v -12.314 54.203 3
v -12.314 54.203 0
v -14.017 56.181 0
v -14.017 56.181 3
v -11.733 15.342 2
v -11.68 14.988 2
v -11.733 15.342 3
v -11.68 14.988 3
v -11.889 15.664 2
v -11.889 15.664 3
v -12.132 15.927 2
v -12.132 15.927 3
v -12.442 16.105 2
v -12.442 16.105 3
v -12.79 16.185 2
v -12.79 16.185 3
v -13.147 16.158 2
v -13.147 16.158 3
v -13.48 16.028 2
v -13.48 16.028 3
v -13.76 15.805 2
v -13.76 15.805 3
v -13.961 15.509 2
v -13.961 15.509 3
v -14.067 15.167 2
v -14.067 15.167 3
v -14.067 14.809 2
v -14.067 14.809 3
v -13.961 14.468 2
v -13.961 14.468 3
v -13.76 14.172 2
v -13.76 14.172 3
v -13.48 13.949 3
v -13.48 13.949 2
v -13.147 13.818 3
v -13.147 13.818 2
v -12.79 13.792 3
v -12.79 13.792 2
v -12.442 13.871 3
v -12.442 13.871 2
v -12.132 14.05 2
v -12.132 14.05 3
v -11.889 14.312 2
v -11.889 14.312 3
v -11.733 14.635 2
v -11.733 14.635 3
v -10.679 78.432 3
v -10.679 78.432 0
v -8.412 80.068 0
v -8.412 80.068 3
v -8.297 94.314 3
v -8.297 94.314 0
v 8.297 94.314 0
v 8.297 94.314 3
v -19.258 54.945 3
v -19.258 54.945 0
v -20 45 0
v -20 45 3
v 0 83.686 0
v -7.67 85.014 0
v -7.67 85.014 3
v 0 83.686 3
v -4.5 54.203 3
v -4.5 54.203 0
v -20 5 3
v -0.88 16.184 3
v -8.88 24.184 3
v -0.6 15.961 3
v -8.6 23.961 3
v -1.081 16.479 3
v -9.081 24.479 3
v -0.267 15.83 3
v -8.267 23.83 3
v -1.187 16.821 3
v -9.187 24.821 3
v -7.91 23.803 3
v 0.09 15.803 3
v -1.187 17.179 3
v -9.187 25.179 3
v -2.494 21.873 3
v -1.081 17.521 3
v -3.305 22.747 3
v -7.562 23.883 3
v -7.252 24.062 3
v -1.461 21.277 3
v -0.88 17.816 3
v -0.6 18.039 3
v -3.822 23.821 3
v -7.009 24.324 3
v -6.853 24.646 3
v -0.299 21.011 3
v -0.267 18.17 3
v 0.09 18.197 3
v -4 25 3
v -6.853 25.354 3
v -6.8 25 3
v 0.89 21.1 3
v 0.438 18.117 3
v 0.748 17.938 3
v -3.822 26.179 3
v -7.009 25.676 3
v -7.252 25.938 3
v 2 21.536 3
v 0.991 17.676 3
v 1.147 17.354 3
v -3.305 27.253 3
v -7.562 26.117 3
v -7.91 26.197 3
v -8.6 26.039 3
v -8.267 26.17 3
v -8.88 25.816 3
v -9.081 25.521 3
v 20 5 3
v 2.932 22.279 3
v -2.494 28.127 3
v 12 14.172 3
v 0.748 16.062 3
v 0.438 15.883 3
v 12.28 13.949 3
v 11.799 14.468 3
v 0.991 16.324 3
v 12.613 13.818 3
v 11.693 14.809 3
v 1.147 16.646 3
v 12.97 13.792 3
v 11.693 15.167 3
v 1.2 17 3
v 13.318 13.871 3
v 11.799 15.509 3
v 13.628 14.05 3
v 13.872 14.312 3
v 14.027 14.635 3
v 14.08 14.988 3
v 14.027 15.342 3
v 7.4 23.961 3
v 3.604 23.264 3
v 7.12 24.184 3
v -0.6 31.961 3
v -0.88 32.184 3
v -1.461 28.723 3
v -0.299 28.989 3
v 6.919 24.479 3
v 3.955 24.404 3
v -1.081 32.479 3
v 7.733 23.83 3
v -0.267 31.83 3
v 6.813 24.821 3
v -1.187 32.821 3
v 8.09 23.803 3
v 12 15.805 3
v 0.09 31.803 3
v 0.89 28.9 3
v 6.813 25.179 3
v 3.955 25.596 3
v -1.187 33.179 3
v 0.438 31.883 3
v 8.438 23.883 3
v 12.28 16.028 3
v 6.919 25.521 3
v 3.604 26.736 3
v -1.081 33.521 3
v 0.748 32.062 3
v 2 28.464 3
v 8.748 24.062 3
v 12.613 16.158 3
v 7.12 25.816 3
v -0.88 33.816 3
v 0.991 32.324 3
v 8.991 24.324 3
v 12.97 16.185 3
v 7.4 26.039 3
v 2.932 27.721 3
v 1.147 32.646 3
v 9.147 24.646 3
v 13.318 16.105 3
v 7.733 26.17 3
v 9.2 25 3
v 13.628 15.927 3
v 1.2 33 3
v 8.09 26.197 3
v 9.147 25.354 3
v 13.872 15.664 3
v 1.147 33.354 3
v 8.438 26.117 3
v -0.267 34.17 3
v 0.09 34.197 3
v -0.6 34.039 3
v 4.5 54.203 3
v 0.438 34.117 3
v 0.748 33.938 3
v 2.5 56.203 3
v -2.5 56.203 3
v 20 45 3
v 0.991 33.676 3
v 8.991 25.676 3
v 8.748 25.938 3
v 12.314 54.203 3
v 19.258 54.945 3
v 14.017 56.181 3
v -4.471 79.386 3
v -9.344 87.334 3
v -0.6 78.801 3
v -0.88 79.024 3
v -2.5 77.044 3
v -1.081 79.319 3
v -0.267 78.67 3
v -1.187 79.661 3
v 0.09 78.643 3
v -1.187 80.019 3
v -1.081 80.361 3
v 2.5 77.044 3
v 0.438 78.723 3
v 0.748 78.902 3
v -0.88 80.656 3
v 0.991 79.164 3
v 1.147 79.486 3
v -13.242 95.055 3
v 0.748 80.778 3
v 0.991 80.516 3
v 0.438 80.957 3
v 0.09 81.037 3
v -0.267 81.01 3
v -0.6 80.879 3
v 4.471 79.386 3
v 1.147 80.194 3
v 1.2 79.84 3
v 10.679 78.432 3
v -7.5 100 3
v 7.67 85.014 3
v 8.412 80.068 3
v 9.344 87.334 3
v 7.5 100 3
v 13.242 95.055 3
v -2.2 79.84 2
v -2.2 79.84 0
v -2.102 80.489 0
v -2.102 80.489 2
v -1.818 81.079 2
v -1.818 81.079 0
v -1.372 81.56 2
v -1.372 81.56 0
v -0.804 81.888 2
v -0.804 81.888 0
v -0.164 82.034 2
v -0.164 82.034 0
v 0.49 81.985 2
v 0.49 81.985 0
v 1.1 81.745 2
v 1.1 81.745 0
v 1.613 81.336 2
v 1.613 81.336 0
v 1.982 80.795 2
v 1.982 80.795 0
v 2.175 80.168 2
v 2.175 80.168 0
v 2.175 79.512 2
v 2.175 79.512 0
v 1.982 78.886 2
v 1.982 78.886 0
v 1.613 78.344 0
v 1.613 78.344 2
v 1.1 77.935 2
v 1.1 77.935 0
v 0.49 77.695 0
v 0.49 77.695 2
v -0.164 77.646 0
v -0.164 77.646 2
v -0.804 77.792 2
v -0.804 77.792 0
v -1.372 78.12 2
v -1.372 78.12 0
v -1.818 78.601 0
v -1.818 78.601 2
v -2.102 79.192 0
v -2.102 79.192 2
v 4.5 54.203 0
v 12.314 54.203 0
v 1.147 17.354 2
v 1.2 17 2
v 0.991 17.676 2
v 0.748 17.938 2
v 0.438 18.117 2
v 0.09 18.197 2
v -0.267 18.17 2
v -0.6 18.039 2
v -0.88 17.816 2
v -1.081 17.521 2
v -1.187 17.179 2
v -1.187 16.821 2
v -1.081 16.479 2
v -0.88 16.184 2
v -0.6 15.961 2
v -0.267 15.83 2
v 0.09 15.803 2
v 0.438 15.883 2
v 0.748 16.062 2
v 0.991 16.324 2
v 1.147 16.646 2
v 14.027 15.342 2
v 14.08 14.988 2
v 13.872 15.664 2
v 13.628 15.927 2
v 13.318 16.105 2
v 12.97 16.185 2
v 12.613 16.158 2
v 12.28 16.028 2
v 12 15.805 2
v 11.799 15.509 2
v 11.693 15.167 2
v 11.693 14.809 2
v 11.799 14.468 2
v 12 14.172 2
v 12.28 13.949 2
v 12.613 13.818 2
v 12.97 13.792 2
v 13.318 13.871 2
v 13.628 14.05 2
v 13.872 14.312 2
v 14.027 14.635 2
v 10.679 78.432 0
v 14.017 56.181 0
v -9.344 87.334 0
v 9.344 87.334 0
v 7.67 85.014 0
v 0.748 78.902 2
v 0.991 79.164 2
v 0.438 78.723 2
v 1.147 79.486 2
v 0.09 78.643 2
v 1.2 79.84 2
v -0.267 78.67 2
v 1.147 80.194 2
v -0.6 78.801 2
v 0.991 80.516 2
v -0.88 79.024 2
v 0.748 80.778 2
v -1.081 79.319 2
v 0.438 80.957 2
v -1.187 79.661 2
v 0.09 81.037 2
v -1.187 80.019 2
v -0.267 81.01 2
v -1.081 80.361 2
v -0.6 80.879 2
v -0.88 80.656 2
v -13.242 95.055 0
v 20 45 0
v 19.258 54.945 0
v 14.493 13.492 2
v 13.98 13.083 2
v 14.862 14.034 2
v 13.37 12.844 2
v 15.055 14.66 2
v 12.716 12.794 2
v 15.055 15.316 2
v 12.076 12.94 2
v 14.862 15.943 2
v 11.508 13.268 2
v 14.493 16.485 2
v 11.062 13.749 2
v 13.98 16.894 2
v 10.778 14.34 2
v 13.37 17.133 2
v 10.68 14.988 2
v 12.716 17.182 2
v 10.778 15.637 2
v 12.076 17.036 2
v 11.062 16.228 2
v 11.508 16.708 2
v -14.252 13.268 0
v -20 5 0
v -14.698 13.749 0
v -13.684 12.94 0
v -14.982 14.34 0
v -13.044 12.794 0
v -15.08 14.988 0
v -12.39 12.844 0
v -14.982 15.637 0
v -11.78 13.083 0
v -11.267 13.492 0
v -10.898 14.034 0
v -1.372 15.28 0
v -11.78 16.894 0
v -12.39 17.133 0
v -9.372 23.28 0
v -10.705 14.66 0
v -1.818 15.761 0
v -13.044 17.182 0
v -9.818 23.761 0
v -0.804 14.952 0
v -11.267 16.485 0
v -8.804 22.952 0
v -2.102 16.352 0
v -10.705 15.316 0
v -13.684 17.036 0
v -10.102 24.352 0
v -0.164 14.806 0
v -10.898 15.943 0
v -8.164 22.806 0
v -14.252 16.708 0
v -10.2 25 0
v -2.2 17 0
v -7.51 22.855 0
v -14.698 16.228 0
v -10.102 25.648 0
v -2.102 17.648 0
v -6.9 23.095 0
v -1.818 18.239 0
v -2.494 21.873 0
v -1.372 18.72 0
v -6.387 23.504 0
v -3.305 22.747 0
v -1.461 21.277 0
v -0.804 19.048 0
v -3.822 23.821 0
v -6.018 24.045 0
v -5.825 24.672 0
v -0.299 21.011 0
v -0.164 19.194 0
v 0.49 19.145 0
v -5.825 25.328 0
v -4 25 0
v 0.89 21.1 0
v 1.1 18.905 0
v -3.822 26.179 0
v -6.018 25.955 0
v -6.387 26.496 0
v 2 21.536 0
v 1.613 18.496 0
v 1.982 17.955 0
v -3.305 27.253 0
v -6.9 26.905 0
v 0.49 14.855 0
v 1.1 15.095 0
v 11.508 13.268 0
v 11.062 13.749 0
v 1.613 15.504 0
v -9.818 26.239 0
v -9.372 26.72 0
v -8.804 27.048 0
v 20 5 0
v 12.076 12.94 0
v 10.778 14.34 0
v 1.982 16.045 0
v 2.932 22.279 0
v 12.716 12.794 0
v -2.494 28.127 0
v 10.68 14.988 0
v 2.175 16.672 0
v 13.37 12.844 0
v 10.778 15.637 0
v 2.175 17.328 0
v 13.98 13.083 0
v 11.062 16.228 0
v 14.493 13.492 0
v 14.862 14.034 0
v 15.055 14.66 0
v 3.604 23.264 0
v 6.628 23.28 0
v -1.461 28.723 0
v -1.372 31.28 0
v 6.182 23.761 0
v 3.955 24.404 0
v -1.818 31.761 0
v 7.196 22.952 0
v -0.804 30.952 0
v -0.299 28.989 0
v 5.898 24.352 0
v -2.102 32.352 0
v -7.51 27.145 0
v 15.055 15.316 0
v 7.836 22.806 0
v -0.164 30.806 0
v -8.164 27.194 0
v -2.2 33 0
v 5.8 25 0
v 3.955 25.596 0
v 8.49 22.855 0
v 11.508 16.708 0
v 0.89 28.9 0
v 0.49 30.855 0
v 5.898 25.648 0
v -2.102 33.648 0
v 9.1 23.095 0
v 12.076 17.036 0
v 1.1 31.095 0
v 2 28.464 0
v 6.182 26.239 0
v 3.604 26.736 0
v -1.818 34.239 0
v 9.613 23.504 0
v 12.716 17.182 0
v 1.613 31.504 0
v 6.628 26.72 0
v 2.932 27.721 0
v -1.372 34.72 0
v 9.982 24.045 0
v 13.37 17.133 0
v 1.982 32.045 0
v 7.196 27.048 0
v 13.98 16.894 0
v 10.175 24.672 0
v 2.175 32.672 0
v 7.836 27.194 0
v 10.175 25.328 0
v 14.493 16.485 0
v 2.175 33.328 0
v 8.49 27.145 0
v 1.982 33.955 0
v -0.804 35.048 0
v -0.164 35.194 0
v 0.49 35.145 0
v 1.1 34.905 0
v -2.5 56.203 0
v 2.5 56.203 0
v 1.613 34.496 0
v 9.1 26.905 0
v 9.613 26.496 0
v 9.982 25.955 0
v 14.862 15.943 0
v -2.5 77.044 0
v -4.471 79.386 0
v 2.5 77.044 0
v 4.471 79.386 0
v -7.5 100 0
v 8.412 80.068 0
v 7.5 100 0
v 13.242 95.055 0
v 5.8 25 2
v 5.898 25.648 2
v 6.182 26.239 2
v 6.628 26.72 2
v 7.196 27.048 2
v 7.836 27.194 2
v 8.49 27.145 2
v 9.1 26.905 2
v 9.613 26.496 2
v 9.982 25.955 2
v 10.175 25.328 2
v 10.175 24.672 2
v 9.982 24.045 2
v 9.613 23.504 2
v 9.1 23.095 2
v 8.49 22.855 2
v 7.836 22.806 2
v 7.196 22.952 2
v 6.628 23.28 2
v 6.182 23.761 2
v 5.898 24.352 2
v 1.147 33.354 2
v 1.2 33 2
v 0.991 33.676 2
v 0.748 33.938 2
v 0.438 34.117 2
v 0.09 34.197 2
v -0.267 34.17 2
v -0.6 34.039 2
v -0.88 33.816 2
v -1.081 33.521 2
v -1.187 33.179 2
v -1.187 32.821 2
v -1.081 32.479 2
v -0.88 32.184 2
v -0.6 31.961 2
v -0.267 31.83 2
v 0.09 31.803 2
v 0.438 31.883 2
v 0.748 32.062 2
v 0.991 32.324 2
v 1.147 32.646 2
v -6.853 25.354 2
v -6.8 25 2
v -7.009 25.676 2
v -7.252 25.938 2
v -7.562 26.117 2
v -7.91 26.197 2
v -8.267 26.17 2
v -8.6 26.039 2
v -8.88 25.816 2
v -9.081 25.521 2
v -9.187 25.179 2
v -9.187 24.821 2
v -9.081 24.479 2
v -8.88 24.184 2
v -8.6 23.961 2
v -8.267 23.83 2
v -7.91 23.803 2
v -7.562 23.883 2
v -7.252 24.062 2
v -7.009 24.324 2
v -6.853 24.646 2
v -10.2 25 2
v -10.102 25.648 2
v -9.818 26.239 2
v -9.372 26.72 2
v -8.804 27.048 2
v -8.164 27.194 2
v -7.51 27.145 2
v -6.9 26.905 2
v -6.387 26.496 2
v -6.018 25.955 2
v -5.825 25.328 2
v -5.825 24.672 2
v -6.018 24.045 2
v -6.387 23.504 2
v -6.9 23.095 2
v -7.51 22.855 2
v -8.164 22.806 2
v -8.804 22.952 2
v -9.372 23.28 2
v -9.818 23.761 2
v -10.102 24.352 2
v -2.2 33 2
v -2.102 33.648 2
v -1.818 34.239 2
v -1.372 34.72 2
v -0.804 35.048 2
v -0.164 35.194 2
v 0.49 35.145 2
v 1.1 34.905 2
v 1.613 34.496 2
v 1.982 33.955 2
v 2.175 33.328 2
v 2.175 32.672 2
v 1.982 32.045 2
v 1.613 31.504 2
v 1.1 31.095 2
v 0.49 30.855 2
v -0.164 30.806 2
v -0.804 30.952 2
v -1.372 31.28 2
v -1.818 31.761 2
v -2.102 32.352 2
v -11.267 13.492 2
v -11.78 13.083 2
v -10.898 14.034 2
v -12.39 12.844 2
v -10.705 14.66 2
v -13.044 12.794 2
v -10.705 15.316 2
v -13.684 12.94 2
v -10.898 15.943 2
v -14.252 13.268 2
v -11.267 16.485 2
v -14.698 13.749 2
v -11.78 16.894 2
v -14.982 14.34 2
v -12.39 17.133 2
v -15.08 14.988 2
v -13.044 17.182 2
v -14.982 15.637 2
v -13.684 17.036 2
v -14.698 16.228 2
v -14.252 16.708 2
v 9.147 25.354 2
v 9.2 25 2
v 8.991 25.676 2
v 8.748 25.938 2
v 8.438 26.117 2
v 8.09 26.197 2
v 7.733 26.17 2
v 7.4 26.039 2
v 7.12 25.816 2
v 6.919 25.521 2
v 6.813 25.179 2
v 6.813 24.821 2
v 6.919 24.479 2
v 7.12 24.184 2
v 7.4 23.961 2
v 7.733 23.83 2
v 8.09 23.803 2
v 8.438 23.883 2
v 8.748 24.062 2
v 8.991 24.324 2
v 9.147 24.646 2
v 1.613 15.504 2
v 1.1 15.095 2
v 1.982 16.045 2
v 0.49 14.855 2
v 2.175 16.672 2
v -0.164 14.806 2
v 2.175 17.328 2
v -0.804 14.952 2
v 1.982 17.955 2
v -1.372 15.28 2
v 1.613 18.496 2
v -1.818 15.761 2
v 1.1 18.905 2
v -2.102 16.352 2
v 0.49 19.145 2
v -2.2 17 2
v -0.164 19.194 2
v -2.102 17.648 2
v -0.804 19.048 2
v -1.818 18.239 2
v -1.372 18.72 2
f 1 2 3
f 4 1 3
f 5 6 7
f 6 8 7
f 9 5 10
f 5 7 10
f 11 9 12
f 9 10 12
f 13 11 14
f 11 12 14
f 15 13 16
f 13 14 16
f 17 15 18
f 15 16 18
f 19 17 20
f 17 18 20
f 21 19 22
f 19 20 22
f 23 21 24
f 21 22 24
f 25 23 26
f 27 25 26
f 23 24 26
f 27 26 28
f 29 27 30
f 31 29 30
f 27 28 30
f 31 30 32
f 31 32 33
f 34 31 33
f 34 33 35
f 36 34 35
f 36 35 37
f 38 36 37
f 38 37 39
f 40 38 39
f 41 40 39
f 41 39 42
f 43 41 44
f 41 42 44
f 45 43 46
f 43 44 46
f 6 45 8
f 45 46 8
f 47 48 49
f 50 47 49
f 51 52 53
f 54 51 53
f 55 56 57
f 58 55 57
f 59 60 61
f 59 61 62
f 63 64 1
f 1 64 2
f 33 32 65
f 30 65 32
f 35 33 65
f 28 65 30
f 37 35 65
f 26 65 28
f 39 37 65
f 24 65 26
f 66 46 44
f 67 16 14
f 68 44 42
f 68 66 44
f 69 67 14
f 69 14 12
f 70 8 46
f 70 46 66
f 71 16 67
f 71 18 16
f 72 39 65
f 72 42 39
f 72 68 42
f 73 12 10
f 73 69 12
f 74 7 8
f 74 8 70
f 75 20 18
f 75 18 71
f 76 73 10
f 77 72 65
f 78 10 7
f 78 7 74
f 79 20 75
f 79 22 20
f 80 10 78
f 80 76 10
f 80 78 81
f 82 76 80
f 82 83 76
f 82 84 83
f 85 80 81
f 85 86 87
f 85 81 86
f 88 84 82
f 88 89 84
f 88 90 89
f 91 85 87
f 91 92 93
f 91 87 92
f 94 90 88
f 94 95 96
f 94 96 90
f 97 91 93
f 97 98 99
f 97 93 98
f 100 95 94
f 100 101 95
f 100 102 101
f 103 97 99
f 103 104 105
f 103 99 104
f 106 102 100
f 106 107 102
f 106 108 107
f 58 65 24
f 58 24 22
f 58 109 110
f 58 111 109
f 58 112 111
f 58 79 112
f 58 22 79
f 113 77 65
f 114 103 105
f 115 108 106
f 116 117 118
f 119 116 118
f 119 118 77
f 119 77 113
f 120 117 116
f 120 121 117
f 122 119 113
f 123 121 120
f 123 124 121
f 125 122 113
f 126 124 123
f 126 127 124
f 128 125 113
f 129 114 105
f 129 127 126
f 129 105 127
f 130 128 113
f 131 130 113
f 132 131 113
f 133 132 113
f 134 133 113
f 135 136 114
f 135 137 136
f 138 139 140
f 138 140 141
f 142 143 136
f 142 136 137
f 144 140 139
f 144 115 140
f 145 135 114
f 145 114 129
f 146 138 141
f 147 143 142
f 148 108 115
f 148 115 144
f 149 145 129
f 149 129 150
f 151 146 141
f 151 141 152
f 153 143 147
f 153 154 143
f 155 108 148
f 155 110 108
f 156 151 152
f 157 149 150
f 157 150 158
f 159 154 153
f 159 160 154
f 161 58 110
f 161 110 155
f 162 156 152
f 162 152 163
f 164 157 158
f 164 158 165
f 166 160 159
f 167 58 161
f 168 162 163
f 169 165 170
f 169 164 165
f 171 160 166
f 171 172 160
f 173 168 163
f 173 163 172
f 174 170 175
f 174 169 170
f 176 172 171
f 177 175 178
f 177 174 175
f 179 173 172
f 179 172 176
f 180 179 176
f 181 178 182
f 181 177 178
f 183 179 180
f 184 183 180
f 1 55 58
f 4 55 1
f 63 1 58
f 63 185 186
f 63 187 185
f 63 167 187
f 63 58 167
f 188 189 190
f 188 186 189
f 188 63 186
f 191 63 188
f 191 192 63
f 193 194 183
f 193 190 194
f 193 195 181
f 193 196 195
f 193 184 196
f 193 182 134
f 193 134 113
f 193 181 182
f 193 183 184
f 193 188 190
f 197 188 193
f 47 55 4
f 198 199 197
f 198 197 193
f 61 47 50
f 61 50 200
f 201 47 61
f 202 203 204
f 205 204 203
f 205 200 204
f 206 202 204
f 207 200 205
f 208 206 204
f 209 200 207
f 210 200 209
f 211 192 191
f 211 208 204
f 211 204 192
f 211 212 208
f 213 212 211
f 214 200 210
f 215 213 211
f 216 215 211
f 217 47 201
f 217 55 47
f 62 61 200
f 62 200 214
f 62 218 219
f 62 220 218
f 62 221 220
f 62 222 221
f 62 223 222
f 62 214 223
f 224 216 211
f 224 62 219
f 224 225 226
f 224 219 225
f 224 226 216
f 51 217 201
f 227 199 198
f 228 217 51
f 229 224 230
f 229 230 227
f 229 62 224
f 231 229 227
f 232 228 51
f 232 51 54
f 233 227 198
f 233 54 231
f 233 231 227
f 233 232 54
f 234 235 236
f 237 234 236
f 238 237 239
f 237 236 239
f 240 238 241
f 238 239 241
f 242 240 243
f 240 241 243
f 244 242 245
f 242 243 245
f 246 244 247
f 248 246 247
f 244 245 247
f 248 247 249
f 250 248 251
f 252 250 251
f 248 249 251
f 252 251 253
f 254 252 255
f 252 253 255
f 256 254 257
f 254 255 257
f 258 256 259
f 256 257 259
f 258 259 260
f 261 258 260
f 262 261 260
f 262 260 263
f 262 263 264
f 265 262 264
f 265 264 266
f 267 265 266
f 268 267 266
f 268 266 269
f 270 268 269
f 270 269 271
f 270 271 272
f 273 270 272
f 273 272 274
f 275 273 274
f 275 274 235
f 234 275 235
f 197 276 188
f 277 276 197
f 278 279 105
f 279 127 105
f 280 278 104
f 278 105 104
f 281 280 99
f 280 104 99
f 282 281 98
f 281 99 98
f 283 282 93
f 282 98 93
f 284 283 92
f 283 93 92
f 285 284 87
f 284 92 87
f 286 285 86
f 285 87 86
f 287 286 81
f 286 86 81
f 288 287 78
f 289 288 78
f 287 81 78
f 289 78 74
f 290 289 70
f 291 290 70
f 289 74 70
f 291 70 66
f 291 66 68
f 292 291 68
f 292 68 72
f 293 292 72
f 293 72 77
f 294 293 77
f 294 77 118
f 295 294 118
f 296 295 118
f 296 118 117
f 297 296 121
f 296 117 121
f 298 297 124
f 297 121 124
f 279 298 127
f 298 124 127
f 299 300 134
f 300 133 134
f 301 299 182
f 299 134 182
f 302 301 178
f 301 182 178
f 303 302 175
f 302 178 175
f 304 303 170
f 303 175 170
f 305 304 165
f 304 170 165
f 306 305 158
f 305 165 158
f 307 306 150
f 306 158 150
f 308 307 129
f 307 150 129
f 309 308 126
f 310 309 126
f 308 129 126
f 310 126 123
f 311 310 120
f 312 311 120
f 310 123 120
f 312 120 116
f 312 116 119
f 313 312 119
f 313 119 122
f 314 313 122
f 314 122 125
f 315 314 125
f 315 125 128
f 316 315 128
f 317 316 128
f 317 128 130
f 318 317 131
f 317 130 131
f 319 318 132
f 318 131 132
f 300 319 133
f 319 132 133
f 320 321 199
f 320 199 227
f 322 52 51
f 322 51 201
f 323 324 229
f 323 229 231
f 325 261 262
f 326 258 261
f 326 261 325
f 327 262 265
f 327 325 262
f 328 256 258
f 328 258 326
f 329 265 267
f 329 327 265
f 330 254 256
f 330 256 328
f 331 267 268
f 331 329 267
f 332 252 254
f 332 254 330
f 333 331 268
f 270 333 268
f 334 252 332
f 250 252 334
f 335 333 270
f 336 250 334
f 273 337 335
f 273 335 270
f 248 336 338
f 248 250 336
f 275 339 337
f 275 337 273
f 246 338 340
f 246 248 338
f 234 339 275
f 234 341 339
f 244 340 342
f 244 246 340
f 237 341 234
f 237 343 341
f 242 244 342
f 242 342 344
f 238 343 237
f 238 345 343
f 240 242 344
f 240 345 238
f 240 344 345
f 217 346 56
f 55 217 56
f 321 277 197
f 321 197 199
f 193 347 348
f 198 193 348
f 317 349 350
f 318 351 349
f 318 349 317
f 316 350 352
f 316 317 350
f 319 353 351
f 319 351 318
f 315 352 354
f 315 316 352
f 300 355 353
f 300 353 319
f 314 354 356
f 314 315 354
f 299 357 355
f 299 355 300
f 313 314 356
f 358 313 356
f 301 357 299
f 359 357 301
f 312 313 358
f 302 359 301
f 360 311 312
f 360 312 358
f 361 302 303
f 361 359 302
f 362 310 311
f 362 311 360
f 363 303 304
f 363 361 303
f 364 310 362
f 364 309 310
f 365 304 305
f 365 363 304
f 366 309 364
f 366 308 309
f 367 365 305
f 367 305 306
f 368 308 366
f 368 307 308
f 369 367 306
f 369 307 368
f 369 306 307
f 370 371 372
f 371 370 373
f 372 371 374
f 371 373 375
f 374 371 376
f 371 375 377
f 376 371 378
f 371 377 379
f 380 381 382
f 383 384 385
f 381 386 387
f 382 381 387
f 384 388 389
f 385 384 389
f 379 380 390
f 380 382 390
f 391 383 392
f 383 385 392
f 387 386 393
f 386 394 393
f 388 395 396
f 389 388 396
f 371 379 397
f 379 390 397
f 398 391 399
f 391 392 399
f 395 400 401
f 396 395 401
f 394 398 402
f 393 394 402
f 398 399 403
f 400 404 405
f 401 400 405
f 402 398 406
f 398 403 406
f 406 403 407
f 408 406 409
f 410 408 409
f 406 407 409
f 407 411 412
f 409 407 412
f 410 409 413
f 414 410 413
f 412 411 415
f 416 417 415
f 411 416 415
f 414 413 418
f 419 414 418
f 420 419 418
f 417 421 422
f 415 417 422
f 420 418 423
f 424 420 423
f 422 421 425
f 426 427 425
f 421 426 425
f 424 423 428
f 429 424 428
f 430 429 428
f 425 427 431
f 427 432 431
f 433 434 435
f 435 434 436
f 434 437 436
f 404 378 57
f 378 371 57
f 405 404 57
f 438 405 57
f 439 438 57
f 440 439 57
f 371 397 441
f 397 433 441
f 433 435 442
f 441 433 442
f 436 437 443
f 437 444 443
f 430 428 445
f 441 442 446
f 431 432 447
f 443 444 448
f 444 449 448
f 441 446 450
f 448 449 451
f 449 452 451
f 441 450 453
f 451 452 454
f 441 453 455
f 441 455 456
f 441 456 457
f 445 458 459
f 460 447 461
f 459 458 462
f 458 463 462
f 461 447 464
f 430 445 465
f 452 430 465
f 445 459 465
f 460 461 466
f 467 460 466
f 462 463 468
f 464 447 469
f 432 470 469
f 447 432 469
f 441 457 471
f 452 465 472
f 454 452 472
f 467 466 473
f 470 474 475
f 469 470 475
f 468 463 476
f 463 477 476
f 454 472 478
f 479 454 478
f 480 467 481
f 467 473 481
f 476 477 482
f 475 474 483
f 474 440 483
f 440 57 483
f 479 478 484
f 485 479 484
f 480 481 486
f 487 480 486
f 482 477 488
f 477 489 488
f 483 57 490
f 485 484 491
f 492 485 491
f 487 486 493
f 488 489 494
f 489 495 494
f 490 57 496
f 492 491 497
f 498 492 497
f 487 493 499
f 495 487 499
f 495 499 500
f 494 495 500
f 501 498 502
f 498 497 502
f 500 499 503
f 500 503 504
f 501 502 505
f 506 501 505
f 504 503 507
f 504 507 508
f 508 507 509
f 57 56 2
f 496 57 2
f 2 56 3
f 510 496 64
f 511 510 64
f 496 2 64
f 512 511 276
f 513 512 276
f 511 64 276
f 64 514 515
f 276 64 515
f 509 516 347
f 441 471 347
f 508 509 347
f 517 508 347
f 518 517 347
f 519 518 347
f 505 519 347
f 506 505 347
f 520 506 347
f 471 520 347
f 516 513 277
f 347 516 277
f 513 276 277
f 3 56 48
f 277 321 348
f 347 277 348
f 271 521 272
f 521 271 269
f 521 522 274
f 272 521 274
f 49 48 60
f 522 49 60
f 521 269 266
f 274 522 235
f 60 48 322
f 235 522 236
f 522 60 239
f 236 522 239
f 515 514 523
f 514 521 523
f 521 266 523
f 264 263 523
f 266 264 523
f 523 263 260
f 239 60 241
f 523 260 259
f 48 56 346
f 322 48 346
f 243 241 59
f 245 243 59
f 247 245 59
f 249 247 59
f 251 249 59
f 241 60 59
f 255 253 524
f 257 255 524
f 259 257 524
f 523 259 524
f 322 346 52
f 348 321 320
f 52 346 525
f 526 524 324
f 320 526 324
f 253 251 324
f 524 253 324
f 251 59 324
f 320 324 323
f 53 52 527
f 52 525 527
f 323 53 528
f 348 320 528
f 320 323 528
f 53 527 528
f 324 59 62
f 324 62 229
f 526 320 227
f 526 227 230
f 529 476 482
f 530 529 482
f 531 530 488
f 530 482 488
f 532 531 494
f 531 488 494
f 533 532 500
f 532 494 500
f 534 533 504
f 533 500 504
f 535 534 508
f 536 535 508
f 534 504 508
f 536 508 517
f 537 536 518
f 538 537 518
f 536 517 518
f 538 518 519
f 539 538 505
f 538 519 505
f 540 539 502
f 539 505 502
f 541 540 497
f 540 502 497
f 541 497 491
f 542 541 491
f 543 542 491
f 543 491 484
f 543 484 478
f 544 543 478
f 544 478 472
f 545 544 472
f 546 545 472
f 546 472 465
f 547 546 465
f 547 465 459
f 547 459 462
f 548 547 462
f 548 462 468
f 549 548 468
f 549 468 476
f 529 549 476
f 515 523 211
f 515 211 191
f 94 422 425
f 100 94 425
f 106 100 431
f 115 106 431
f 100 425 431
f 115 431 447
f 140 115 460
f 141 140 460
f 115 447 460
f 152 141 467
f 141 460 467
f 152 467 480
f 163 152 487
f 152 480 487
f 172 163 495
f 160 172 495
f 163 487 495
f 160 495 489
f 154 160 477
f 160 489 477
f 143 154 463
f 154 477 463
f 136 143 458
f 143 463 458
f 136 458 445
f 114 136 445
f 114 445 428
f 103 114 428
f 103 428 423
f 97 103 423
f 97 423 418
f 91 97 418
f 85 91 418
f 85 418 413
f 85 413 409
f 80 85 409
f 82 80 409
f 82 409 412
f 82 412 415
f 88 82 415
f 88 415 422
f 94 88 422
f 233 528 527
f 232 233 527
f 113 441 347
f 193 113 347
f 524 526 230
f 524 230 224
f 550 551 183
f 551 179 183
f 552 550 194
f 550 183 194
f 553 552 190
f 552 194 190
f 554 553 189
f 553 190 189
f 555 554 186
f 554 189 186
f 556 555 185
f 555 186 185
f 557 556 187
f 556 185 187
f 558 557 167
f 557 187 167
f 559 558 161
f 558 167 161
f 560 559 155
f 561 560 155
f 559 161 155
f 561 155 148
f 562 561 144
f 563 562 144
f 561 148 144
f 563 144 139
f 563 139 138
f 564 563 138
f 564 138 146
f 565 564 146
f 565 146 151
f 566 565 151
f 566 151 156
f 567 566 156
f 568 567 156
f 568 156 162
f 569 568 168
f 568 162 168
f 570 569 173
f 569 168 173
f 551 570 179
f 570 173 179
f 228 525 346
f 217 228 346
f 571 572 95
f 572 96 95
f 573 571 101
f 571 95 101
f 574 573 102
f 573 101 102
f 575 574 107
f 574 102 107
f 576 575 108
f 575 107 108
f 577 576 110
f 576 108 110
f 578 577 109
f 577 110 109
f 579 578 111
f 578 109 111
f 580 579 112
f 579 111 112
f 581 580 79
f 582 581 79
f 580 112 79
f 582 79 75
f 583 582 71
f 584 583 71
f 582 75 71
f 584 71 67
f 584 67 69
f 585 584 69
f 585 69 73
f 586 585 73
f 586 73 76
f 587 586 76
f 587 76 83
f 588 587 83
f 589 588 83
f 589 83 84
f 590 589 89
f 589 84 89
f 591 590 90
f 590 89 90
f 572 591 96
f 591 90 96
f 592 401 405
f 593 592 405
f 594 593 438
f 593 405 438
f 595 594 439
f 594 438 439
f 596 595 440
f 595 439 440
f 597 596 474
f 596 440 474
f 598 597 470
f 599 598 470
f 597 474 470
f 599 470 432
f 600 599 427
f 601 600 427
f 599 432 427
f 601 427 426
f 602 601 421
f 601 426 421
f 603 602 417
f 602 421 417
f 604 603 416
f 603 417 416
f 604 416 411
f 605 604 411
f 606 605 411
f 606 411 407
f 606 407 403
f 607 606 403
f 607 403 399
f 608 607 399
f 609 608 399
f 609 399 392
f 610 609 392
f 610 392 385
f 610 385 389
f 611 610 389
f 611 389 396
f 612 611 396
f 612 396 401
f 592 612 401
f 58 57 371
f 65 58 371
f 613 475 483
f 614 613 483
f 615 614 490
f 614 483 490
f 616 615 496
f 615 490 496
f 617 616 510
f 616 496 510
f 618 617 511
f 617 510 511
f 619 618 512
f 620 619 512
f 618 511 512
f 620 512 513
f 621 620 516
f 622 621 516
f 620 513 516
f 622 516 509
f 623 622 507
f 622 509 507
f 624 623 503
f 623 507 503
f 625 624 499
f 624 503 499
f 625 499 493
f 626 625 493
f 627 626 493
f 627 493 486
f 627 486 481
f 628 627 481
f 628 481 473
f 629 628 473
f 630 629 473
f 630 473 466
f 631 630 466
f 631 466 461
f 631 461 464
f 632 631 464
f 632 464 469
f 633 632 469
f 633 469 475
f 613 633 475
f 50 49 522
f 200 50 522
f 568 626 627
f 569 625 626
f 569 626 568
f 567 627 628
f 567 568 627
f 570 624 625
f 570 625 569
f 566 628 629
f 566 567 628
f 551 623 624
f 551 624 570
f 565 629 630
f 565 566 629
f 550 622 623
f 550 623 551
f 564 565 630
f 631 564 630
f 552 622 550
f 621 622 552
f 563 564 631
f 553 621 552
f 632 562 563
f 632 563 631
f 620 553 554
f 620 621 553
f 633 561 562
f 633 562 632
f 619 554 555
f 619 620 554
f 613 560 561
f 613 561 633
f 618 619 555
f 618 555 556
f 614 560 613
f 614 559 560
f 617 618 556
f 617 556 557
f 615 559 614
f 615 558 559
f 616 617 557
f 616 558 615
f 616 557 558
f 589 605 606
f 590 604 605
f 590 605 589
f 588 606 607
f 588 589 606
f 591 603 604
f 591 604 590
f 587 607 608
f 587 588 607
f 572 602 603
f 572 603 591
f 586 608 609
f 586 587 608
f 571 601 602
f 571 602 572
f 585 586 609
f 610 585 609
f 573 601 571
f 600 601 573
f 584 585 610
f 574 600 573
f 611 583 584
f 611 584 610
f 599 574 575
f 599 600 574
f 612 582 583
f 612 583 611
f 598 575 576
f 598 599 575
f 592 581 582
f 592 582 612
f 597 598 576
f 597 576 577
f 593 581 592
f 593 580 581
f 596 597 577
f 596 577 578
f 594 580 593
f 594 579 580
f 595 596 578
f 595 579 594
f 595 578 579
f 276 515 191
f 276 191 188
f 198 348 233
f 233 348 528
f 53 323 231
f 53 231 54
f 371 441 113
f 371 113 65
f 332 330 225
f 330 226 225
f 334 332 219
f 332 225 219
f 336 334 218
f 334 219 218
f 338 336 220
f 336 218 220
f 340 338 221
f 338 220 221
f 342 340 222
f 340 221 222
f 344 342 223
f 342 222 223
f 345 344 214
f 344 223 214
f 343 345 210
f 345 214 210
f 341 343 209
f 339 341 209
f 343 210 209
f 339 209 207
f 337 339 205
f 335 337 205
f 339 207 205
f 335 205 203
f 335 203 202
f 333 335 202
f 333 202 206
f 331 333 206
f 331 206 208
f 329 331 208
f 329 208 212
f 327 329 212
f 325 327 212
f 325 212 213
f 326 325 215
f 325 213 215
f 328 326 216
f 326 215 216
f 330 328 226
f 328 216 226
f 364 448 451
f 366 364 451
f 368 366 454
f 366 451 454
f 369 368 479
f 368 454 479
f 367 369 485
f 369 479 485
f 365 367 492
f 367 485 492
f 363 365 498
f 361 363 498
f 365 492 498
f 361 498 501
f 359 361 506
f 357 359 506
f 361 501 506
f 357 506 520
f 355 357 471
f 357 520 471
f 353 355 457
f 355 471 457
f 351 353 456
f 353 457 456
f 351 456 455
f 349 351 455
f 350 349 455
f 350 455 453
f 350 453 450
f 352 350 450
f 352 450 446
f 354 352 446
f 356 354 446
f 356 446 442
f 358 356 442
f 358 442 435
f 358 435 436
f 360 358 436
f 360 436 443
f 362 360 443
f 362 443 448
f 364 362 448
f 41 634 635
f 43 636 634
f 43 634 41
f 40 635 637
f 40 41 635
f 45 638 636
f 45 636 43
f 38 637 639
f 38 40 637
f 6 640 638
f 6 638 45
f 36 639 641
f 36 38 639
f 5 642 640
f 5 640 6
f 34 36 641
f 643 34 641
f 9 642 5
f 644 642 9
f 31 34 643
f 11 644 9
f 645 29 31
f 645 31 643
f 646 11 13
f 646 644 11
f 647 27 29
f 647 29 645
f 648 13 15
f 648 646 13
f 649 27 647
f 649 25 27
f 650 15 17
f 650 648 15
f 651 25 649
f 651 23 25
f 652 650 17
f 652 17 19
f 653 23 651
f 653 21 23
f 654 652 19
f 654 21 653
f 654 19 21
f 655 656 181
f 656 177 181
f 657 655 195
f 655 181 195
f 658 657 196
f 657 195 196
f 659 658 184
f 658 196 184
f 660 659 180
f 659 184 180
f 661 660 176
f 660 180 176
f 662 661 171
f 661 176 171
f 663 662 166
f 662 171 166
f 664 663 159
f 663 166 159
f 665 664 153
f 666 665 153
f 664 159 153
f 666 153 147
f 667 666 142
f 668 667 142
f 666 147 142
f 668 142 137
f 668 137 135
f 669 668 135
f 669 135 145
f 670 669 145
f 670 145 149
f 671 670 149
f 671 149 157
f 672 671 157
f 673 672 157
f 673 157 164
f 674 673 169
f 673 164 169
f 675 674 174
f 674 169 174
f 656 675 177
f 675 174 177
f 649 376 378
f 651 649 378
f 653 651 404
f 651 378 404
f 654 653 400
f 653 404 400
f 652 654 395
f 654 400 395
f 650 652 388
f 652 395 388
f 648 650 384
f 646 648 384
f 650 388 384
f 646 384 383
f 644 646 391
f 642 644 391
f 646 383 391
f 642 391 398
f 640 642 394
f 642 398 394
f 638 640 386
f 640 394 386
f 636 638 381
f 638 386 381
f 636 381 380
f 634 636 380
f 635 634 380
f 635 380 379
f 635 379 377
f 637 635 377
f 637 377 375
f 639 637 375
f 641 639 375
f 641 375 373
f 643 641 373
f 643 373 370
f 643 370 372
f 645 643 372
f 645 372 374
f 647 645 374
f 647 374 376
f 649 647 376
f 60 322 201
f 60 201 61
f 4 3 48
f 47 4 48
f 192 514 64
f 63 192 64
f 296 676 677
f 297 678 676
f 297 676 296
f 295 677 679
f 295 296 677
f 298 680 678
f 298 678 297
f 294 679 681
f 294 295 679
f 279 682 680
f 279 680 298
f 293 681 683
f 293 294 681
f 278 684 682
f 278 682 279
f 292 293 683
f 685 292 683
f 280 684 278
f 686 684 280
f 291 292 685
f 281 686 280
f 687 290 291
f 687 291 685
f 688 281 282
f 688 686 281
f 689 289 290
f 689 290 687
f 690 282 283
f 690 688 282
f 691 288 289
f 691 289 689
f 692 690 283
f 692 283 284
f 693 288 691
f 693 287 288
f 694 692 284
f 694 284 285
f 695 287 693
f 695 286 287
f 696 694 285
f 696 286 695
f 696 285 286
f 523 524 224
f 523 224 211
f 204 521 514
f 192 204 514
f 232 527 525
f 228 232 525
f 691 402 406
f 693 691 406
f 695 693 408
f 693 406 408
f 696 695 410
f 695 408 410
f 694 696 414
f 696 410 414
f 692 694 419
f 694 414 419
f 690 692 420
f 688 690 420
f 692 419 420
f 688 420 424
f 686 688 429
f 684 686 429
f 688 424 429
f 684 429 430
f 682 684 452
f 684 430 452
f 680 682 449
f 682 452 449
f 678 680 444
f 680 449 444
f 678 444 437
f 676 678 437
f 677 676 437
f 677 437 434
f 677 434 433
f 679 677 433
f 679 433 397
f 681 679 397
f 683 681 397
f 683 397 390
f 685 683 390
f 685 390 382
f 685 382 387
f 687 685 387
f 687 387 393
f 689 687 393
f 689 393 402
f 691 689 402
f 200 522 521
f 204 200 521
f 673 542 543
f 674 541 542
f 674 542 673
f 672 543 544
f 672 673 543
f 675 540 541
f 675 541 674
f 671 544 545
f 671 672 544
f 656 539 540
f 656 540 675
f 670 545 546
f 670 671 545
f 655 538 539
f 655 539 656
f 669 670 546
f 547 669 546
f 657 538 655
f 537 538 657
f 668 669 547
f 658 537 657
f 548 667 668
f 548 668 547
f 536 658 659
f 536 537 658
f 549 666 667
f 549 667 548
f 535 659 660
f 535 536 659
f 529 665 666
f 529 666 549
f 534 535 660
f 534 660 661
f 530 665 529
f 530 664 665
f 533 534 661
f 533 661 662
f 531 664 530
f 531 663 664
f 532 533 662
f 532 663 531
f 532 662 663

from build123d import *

# Parameters (mm, degrees)
EXTRUDE_1_DEPTH              = 3
CUT_EXTRUDE_1_REACH          = 104.025
SKETCH_2_W                   = 5
SKETCH_2_H                   = 10
HOLE_WIZARD_M2_1_D           = 2.4
HOLE_WIZARD_M2_1_CBORE_D     = 4.4
HOLE_WIZARD_M2_1_CBORE_DEPTH = 2
CUT_EXTRUDE_2_REACH          = 104.025
SKETCH_5_R                   = 4
HOLE_WIZARD_M2_2_D           = 2.4
HOLE_WIZARD_M2_2_CBORE_D     = 4.4
HOLE_WIZARD_M2_2_CBORE_DEPTH = 2
HOLE_WIZARD_M2_3_D           = 2.4
HOLE_WIZARD_M2_3_CBORE_D     = 4.4
HOLE_WIZARD_M2_3_CBORE_DEPTH = 2
CUT_EXTRUDE_3_DEPTH          = 3
HOLE_WIZARD_M2_5_D           = 2.4
HOLE_WIZARD_M2_5_CBORE_D     = 4.4
HOLE_WIZARD_M2_5_CBORE_DEPTH = 2
HOLE_WIZARD_M2_6_D           = 2.4
HOLE_WIZARD_M2_6_CBORE_D     = 4.4
HOLE_WIZARD_M2_6_CBORE_DEPTH = 2
SKETCH_17_OUTSIDE_W          = 82.796
SKETCH_17_OUTSIDE_H          = 242.796
CUT_EXTRUDE_4_DEPTH          = 10


with BuildPart() as part:
    # 草图1 → 凸台-拉伸1 (new body)
    with BuildSketch(Plane.XY):
        Polygon((20, 5), (20, 45), (19.258297735, 54.944681764), (13.241702265, 95.055318236), (7.5, 100), (-7.5, 100), (-13.241702265, 95.055318236), (-19.258297735, 54.944681764), (-20, 45), (-20, 5), (-19.379826327, -4.961389384), (-7.748069469, -98.015444247), (-5.5, -100), (5.5, -100), (7.748069469, -98.015444247), (19.379826327, -4.961389384), align=None)
    extrude(amount=EXTRUDE_1_DEPTH)

    # 草图2 → 切除-拉伸1 (cut, up to next)
    with BuildSketch(Plane.XY.offset(3), mode=Mode.PRIVATE) as cut_extrude_1_sk1:
        Polygon((10, -5), (-10, -5), (0, -22.320508076), align=None)
    cut_extrude_1_tool1 = extrude(cut_extrude_1_sk1.sketch, amount=-CUT_EXTRUDE_1_REACH, mode=Mode.PRIVATE) & part.part
    # 草图2 → 切除-拉伸1 (cut, up to next)
    with BuildSketch(Plane.XY.offset(3), mode=Mode.PRIVATE) as cut_extrude_1_sk2:
        Polygon((6.211088907, -70), (13.938881842, -8.177656525), (2.5, -27.990381057), (2.5, -70), align=None)
    cut_extrude_1_tool2 = extrude(cut_extrude_1_sk2.sketch, amount=-CUT_EXTRUDE_1_REACH, mode=Mode.PRIVATE) & part.part
    # 草图2 → 切除-拉伸1 (cut, up to next)
    with BuildSketch(Plane.XY.offset(3), mode=Mode.PRIVATE) as cut_extrude_1_sk3:
        Polygon((-13.938881842, -8.177656525), (-2.5, -27.990381057), (-2.5, -70), (-6.211088907, -70), align=None)
    cut_extrude_1_tool3 = extrude(cut_extrude_1_sk3.sketch, amount=-CUT_EXTRUDE_1_REACH, mode=Mode.PRIVATE) & part.part
    # 草图2 → 切除-拉伸1 (cut, up to next)
    with BuildSketch(Plane.XY.offset(3), mode=Mode.PRIVATE) as cut_extrude_1_sk4:
        with Locations((0, -85)):
            Rectangle(SKETCH_2_W, SKETCH_2_H)
    cut_extrude_1_tool4 = extrude(cut_extrude_1_sk4.sketch, amount=-CUT_EXTRUDE_1_REACH, mode=Mode.PRIVATE) & part.part
    add(cut_extrude_1_tool1.solids().sort_by_distance((0, -10.773503, 3))[0], mode=Mode.SUBTRACT)
    add(cut_extrude_1_tool2.solids().sort_by_distance((6.712708, -39.914502, 3))[0], mode=Mode.SUBTRACT)
    add(cut_extrude_1_tool3.solids().sort_by_distance((-6.712708, -39.914502, 3))[0], mode=Mode.SUBTRACT)
    add(cut_extrude_1_tool4.solids().sort_by_distance((0, -85, 3))[0], mode=Mode.SUBTRACT)

    # M2 凹头盖螺钉的柱形沉头孔1 (through all)
    with Locations(Plane(origin=(5.586088907, -75, 0), x_dir=(-1, 0, 0), z_dir=(0, 0, -1))):
        with Locations((0, 0), (11.172177814, 0)):
            CounterBoreHole(HOLE_WIZARD_M2_1_D / 2, HOLE_WIZARD_M2_1_CBORE_D / 2, HOLE_WIZARD_M2_1_CBORE_DEPTH)

    # 草图5 → 切除-拉伸2 (cut, up to next)
    with BuildSketch(Plane(origin=(0, 0, 0), x_dir=(-1, 0, 0), z_dir=(0, 0, -1)), mode=Mode.PRIVATE) as cut_extrude_2_sk1:
        with Locations((0, 25)):
            Circle(SKETCH_5_R)
    cut_extrude_2_tool1 = extrude(cut_extrude_2_sk1.sketch, amount=-CUT_EXTRUDE_2_REACH, mode=Mode.PRIVATE) & part.part
    add(cut_extrude_2_tool1.solids().sort_by_distance((0, 25, 0))[0], mode=Mode.SUBTRACT)

    # M2 凹头盖螺钉的柱形沉头孔2 (through all)
    with Locations(Plane(origin=(8, 25, 0), x_dir=(-1, 0, 0), z_dir=(0, 0, -1))):
        with Locations((0, 0), (8, 8), (16, 0), (8, -8)):
            CounterBoreHole(HOLE_WIZARD_M2_2_D / 2, HOLE_WIZARD_M2_2_CBORE_D / 2, HOLE_WIZARD_M2_2_CBORE_DEPTH)

    # M2 凹头盖螺钉的柱形沉头孔3 (through all)
    with Locations(Plane(origin=(12.880020708, -5.011657807, 0), x_dir=(-1, 0, 0), z_dir=(0, 0, -1))):
        with Locations((0, 0), (25.760041416, 0)):
            CounterBoreHole(HOLE_WIZARD_M2_3_D / 2, HOLE_WIZARD_M2_3_CBORE_D / 2, HOLE_WIZARD_M2_3_CBORE_DEPTH)

    # 草图10 → 切除-拉伸3 (cut)
    with BuildSketch(Plane(origin=(0, 0, 0), x_dir=(-1, 0, 0), z_dir=(0, 0, -1))):
        Polygon((-14.016935065, 56.180852205), (-10.679274874, 78.431920145), (-8.411945476, 80.068406675), (-4.470648492, 79.385634325), (-2.5, 77.04424815), (-2.5, 56.2029795), (-4.5, 54.2029795), (-12.313615971, 54.2029795), align=None)
        Polygon((-9.344020618, 87.333615184), (-8.2970205, 94.313615971), (0, 94.313615971), (8.2970205, 94.313615971), (9.344020618, 87.333615184), (7.670053032, 85.014356303), (0, 83.685631227), (-7.670053032, 85.014356303), align=None)
        Polygon((4.5, 54.2029795), (12.313615971, 54.2029795), (14.016935065, 56.180852205), (10.679274874, 78.431920145), (8.411945476, 80.068406675), (4.470648492, 79.385634325), (2.5, 77.04424815), (2.5, 56.2029795), align=None)
    extrude(amount=-CUT_EXTRUDE_3_DEPTH, mode=Mode.SUBTRACT)

    # M2 凹头盖螺钉的柱形沉头孔5 (through all)
    with Locations(Plane(origin=(0, 79.840052868, 0), x_dir=(-1, 0, 0), z_dir=(0, 0, -1))):
        with Locations((0, 0)):
            CounterBoreHole(HOLE_WIZARD_M2_5_D / 2, HOLE_WIZARD_M2_5_CBORE_D / 2, HOLE_WIZARD_M2_5_CBORE_DEPTH)

    # M2 凹头盖螺钉的柱形沉头孔6 (through all)
    with Locations(Plane(origin=(12.880020708, 14.988342193, 0), x_dir=(-1, 0, 0), z_dir=(0, 0, -1))):
        with Locations((0, 0), (25.760041416, 0)):
            CounterBoreHole(HOLE_WIZARD_M2_6_D / 2, HOLE_WIZARD_M2_6_CBORE_D / 2, HOLE_WIZARD_M2_6_CBORE_DEPTH)

    # 草图17 outside → 切除-拉伸4 (cut)
    with BuildSketch(Plane(origin=(0, 0, 0), x_dir=(-1, 0, 0), z_dir=(0, 0, -1))):
        Rectangle(SKETCH_17_OUTSIDE_W, SKETCH_17_OUTSIDE_H)
        Polygon((-20, 5), (20, 5), (20, 99.998273705), (7.5, 100), (-7.5, 100), (-20, 99.998273705), align=None, mode=Mode.SUBTRACT)
    extrude(amount=-CUT_EXTRUDE_4_DEPTH, mode=Mode.SUBTRACT)


solid = part.part
